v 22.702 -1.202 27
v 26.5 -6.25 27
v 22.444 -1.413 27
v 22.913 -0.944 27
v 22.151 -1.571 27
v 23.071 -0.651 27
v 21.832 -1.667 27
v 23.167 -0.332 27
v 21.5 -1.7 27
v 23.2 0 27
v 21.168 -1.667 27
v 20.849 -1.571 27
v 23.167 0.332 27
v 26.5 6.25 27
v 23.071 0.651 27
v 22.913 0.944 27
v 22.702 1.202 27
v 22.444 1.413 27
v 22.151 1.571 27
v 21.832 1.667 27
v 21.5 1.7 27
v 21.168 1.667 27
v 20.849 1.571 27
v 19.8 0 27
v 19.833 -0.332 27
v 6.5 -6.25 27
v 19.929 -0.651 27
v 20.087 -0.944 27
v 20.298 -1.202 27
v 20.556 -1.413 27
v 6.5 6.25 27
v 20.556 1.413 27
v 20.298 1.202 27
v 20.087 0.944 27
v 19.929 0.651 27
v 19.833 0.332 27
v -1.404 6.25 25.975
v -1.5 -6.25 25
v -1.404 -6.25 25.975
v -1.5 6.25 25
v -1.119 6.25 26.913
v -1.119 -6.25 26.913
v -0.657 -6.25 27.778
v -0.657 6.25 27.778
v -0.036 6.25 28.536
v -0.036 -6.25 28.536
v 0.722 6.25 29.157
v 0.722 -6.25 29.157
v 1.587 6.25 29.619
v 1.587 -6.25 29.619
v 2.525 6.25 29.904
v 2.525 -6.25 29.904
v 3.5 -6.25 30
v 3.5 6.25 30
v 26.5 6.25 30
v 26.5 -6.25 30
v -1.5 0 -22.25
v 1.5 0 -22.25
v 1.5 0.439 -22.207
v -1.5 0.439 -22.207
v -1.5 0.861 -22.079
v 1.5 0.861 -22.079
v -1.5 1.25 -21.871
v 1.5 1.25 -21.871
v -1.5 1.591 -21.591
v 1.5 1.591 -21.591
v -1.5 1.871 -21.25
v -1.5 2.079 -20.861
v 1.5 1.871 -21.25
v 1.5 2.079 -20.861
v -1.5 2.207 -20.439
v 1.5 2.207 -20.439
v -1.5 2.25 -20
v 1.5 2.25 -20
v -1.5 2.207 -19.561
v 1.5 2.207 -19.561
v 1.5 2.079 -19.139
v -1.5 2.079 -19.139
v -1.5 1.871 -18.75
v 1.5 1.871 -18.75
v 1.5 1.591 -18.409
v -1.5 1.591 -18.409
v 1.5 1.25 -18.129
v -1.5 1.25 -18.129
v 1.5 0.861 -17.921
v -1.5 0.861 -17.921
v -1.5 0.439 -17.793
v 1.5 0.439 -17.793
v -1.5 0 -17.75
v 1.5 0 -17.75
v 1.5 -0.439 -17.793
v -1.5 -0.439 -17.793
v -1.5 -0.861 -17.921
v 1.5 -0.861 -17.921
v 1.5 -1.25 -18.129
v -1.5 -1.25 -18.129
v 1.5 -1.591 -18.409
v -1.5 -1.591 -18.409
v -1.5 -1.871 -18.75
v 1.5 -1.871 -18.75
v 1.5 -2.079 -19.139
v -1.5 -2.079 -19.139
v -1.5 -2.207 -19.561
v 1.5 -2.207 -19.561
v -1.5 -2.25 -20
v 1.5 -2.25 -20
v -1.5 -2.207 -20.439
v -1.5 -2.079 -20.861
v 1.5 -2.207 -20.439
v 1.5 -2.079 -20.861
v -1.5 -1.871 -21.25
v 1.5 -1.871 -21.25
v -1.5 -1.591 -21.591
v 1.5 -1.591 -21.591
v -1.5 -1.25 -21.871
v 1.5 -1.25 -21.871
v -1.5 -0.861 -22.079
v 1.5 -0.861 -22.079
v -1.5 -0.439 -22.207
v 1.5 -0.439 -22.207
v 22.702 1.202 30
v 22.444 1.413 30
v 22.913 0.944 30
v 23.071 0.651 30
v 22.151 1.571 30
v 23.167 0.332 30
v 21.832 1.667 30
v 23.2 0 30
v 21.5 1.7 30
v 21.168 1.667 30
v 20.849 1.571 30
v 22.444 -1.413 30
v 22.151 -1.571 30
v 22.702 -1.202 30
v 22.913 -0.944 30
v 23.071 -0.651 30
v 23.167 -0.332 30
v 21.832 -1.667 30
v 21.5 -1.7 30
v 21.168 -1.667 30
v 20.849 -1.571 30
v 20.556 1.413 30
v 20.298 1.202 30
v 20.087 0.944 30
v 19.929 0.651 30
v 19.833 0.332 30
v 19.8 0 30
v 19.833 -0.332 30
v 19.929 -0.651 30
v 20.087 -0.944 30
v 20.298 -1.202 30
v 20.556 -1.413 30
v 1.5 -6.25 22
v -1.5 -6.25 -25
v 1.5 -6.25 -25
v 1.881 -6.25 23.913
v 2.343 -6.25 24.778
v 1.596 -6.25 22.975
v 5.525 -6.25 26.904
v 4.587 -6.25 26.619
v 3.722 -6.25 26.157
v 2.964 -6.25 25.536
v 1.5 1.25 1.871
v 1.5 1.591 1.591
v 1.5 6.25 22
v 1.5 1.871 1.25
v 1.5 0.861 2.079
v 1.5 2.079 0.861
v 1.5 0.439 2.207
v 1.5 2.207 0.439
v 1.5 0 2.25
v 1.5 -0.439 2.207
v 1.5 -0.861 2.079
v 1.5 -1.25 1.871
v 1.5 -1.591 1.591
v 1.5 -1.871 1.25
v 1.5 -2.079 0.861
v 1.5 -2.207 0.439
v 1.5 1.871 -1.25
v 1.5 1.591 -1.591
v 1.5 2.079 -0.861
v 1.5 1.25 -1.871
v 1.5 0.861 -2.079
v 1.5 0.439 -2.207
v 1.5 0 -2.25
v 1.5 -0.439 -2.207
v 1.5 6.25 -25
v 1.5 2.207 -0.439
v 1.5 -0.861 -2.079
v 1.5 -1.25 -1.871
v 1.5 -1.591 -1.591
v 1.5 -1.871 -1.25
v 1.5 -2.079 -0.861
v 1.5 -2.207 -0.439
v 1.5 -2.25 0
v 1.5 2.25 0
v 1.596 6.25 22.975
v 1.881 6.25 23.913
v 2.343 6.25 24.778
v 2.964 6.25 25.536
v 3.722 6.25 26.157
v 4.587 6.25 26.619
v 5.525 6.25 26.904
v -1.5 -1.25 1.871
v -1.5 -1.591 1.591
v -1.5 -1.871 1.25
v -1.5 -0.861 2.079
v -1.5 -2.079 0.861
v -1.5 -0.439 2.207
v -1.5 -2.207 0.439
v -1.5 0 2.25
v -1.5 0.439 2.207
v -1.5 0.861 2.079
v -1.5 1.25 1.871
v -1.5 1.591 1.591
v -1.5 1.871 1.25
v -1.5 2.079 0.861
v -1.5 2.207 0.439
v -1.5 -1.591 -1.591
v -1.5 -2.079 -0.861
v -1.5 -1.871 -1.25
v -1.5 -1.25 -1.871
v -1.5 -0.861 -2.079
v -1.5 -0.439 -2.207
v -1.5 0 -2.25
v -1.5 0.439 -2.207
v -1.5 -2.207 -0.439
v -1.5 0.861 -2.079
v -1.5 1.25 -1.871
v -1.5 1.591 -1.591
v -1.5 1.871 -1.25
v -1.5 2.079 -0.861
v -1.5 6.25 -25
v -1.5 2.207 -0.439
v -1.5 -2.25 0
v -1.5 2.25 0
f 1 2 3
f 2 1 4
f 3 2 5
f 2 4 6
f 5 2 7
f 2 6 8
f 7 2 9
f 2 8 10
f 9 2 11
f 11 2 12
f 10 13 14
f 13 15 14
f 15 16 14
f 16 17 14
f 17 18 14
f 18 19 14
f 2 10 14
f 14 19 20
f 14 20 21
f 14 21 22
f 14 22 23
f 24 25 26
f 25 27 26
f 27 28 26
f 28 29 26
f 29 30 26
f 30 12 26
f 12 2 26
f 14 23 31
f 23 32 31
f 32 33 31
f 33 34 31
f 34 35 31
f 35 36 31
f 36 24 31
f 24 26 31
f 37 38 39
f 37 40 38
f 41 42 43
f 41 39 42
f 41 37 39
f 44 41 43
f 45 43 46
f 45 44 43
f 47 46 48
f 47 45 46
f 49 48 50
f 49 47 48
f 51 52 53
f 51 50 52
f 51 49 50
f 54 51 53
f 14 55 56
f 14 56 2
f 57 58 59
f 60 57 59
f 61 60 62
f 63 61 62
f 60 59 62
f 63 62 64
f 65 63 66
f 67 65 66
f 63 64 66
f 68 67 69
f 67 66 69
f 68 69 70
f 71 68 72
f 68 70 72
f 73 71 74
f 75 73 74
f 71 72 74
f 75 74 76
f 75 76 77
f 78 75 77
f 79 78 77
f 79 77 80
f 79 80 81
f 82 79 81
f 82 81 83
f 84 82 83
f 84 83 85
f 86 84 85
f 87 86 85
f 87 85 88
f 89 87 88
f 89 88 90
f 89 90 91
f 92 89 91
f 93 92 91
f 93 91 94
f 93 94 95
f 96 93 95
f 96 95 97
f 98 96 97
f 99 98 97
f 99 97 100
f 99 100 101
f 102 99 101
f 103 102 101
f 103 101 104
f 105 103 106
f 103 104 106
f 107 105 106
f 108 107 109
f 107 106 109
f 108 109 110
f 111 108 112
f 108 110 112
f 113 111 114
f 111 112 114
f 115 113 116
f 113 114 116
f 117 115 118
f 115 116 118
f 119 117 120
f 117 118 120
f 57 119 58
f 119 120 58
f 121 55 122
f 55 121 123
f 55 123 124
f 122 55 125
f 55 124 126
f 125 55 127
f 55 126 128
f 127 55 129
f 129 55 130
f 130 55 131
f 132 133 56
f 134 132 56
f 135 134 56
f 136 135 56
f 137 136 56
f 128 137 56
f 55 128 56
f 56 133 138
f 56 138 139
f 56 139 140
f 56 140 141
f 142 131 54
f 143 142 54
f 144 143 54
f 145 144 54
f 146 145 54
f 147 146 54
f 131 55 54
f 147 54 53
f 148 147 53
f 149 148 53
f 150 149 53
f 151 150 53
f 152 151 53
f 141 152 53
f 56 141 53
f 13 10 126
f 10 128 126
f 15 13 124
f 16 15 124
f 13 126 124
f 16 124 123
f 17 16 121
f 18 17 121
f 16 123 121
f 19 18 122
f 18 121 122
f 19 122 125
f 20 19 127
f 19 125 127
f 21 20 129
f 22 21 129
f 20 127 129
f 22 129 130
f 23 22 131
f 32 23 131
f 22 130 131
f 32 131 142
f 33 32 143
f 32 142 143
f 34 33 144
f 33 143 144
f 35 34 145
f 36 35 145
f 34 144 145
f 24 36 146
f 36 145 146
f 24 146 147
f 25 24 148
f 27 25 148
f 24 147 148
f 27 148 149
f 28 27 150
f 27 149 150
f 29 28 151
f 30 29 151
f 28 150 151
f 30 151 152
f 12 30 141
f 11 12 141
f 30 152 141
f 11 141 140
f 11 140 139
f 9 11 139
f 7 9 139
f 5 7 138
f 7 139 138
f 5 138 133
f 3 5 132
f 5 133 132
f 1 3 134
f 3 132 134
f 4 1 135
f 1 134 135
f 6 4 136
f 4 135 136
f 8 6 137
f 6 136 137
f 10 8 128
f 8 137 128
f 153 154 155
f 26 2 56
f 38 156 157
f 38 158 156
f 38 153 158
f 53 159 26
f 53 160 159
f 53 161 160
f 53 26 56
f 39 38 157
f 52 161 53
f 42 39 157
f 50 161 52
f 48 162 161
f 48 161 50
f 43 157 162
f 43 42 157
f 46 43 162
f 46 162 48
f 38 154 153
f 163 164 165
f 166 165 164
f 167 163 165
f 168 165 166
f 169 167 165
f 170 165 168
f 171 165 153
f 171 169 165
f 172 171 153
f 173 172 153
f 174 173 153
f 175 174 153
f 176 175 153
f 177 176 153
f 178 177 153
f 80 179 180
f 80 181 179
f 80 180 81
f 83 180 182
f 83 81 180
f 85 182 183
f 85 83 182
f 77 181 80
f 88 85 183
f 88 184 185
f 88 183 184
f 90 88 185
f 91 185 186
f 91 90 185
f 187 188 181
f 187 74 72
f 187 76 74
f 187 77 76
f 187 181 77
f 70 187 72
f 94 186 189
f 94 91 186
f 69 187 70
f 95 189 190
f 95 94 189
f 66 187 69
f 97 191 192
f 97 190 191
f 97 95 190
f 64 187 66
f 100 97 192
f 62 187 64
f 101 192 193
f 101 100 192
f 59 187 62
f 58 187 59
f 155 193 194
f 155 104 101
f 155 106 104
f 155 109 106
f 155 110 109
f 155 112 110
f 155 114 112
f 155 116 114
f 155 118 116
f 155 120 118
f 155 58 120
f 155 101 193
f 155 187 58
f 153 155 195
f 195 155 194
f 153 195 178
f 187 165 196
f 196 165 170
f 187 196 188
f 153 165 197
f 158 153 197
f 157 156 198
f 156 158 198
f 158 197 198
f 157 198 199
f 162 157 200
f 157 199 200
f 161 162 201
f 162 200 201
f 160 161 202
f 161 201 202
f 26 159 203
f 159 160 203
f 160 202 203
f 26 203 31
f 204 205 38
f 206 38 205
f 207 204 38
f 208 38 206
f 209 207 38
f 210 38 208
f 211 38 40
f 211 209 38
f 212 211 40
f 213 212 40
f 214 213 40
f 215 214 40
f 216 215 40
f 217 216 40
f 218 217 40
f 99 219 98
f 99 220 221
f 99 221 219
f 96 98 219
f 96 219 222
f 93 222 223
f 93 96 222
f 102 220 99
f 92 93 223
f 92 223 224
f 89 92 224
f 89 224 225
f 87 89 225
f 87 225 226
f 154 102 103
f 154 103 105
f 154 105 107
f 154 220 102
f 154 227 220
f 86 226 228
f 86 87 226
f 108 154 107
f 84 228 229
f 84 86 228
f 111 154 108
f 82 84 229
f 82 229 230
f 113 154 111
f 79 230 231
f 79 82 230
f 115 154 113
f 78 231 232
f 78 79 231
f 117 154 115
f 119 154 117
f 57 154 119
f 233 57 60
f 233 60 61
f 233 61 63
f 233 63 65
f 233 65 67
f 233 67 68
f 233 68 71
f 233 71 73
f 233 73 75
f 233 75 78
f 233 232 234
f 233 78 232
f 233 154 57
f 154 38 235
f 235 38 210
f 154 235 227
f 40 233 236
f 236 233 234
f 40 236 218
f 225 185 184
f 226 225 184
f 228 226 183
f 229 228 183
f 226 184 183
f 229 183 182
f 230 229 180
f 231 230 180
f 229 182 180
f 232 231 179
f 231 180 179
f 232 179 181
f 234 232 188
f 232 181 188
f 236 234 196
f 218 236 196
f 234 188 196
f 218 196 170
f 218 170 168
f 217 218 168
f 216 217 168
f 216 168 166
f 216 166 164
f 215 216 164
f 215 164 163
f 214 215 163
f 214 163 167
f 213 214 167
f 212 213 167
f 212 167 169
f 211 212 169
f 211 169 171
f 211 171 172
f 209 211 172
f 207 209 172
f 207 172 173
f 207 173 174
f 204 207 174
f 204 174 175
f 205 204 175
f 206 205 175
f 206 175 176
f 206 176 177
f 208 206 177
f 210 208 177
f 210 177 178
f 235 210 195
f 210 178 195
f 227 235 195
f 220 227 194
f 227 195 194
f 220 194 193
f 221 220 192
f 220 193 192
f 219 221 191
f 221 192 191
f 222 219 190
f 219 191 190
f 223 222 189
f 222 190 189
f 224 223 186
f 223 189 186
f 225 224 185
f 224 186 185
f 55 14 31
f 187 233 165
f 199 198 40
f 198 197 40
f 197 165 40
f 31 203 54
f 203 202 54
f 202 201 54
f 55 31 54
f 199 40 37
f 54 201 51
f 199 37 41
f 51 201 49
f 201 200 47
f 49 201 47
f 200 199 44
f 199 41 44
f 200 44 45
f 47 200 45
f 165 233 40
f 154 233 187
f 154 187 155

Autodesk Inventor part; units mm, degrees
ref_plane "YZ Plane" through (0, 0, 0) normal (1, 0, 0) x (0, 1, 0)
ref_plane "XZ Plane" through (0, 0, 0) normal (0, 1, 0) x (-1, 0, 0)
ref_plane "XY Plane" through (0, 0, 0) normal (0, 0, 1) x (1, 0, 0)
sketch "スケッチ1" plane through (0, 0, 0) normal (1, 0, 0) x (0, 1, 0)
  line L0 (6.25, -25) -> (-6.25, -25)
  line L1 (-6.25, -25) -> (-6.25, 25)
  line L2 (-6.25, 25) -> (6.25, 25)
  line L3 (6.25, 25) -> (6.25, -25)
  line L4 (6.25, -25) -> (-6.25, 25) construction
  line L5 (-6.25, -25) -> (6.25, 25) construction
  point P0 (0, 0)
  dimension "d0" = 12.5
  dimension "d1" = 50
extrude "押し出し1" add sketch "スケッチ1" along normal mid plane 3
sketch "スケッチ2" plane through (1.5, 0, 0) normal (1, 0, 0) x (0, 0, -1)
  circle A0 centre (20, 0) radius 2.25
  circle A1 centre (0, 0) radius 2.25
  dimension "d4" = 4.5
  dimension "d5" = 4.5
extrude "押し出し2" cut sketch "スケッチ2" against normal blind 3
sketch "スケッチ3" plane through (-1.5, -6.25, 25) normal (0, 0, 1) x (1, 0, 0)
  line L0 (0, 0) -> (0, 12.5) projected
  line L1 (3, 12.5) -> (3, 0) projected
  line L2 (0, 0) -> (3, 0)
  line L3 (3, 0) -> (3, 12.5)
  line L4 (3, 12.5) -> (0, 12.5)
  line L5 (0, 12.5) -> (0, 0)
  point P0 (1.5, 6.25)
extrude "押し出し3" add sketch "スケッチ3" along normal blind 5
sketch "スケッチ4" plane through (1.5, 0, 0) normal (1, 0, 0) x (0, 0, -1)
  line L0 (25, -6.25) -> (-30, -6.25) projected
  line L1 (25, 6.25) -> (-30, 6.25) projected
  line L2 (-30, -6.25) -> (-27, -6.25)
  line L3 (-27, -6.25) -> (-27, 6.25)
  line L4 (-27, 6.25) -> (-30, 6.25)
  line L5 (-30, 6.25) -> (-30, -6.25)
  point P0 (0, 0)
  dimension "d10" = 3
extrude "押し出し4" add sketch "スケッチ4" along normal blind 25
fillet "フィレット1" radius 5 1 edges at (1.5, 0, 27)
fillet "フィレット2" radius 5 1 edges at (-1.5, 0, 30)
sketch "スケッチ5" plane through (-1.5, -6.25, 30) normal (0, 0, 1) x (1, 0, 0)
  circle A0 centre (23, 6.25) radius 1.7
  point P0 (1.5, 6.25)
  dimension "d15" = 3.4
extrude "押し出し5" cut sketch "スケッチ5" against normal blind 25
properties part number "Scissor_fixing_parts" material "ABS プラスチック"
